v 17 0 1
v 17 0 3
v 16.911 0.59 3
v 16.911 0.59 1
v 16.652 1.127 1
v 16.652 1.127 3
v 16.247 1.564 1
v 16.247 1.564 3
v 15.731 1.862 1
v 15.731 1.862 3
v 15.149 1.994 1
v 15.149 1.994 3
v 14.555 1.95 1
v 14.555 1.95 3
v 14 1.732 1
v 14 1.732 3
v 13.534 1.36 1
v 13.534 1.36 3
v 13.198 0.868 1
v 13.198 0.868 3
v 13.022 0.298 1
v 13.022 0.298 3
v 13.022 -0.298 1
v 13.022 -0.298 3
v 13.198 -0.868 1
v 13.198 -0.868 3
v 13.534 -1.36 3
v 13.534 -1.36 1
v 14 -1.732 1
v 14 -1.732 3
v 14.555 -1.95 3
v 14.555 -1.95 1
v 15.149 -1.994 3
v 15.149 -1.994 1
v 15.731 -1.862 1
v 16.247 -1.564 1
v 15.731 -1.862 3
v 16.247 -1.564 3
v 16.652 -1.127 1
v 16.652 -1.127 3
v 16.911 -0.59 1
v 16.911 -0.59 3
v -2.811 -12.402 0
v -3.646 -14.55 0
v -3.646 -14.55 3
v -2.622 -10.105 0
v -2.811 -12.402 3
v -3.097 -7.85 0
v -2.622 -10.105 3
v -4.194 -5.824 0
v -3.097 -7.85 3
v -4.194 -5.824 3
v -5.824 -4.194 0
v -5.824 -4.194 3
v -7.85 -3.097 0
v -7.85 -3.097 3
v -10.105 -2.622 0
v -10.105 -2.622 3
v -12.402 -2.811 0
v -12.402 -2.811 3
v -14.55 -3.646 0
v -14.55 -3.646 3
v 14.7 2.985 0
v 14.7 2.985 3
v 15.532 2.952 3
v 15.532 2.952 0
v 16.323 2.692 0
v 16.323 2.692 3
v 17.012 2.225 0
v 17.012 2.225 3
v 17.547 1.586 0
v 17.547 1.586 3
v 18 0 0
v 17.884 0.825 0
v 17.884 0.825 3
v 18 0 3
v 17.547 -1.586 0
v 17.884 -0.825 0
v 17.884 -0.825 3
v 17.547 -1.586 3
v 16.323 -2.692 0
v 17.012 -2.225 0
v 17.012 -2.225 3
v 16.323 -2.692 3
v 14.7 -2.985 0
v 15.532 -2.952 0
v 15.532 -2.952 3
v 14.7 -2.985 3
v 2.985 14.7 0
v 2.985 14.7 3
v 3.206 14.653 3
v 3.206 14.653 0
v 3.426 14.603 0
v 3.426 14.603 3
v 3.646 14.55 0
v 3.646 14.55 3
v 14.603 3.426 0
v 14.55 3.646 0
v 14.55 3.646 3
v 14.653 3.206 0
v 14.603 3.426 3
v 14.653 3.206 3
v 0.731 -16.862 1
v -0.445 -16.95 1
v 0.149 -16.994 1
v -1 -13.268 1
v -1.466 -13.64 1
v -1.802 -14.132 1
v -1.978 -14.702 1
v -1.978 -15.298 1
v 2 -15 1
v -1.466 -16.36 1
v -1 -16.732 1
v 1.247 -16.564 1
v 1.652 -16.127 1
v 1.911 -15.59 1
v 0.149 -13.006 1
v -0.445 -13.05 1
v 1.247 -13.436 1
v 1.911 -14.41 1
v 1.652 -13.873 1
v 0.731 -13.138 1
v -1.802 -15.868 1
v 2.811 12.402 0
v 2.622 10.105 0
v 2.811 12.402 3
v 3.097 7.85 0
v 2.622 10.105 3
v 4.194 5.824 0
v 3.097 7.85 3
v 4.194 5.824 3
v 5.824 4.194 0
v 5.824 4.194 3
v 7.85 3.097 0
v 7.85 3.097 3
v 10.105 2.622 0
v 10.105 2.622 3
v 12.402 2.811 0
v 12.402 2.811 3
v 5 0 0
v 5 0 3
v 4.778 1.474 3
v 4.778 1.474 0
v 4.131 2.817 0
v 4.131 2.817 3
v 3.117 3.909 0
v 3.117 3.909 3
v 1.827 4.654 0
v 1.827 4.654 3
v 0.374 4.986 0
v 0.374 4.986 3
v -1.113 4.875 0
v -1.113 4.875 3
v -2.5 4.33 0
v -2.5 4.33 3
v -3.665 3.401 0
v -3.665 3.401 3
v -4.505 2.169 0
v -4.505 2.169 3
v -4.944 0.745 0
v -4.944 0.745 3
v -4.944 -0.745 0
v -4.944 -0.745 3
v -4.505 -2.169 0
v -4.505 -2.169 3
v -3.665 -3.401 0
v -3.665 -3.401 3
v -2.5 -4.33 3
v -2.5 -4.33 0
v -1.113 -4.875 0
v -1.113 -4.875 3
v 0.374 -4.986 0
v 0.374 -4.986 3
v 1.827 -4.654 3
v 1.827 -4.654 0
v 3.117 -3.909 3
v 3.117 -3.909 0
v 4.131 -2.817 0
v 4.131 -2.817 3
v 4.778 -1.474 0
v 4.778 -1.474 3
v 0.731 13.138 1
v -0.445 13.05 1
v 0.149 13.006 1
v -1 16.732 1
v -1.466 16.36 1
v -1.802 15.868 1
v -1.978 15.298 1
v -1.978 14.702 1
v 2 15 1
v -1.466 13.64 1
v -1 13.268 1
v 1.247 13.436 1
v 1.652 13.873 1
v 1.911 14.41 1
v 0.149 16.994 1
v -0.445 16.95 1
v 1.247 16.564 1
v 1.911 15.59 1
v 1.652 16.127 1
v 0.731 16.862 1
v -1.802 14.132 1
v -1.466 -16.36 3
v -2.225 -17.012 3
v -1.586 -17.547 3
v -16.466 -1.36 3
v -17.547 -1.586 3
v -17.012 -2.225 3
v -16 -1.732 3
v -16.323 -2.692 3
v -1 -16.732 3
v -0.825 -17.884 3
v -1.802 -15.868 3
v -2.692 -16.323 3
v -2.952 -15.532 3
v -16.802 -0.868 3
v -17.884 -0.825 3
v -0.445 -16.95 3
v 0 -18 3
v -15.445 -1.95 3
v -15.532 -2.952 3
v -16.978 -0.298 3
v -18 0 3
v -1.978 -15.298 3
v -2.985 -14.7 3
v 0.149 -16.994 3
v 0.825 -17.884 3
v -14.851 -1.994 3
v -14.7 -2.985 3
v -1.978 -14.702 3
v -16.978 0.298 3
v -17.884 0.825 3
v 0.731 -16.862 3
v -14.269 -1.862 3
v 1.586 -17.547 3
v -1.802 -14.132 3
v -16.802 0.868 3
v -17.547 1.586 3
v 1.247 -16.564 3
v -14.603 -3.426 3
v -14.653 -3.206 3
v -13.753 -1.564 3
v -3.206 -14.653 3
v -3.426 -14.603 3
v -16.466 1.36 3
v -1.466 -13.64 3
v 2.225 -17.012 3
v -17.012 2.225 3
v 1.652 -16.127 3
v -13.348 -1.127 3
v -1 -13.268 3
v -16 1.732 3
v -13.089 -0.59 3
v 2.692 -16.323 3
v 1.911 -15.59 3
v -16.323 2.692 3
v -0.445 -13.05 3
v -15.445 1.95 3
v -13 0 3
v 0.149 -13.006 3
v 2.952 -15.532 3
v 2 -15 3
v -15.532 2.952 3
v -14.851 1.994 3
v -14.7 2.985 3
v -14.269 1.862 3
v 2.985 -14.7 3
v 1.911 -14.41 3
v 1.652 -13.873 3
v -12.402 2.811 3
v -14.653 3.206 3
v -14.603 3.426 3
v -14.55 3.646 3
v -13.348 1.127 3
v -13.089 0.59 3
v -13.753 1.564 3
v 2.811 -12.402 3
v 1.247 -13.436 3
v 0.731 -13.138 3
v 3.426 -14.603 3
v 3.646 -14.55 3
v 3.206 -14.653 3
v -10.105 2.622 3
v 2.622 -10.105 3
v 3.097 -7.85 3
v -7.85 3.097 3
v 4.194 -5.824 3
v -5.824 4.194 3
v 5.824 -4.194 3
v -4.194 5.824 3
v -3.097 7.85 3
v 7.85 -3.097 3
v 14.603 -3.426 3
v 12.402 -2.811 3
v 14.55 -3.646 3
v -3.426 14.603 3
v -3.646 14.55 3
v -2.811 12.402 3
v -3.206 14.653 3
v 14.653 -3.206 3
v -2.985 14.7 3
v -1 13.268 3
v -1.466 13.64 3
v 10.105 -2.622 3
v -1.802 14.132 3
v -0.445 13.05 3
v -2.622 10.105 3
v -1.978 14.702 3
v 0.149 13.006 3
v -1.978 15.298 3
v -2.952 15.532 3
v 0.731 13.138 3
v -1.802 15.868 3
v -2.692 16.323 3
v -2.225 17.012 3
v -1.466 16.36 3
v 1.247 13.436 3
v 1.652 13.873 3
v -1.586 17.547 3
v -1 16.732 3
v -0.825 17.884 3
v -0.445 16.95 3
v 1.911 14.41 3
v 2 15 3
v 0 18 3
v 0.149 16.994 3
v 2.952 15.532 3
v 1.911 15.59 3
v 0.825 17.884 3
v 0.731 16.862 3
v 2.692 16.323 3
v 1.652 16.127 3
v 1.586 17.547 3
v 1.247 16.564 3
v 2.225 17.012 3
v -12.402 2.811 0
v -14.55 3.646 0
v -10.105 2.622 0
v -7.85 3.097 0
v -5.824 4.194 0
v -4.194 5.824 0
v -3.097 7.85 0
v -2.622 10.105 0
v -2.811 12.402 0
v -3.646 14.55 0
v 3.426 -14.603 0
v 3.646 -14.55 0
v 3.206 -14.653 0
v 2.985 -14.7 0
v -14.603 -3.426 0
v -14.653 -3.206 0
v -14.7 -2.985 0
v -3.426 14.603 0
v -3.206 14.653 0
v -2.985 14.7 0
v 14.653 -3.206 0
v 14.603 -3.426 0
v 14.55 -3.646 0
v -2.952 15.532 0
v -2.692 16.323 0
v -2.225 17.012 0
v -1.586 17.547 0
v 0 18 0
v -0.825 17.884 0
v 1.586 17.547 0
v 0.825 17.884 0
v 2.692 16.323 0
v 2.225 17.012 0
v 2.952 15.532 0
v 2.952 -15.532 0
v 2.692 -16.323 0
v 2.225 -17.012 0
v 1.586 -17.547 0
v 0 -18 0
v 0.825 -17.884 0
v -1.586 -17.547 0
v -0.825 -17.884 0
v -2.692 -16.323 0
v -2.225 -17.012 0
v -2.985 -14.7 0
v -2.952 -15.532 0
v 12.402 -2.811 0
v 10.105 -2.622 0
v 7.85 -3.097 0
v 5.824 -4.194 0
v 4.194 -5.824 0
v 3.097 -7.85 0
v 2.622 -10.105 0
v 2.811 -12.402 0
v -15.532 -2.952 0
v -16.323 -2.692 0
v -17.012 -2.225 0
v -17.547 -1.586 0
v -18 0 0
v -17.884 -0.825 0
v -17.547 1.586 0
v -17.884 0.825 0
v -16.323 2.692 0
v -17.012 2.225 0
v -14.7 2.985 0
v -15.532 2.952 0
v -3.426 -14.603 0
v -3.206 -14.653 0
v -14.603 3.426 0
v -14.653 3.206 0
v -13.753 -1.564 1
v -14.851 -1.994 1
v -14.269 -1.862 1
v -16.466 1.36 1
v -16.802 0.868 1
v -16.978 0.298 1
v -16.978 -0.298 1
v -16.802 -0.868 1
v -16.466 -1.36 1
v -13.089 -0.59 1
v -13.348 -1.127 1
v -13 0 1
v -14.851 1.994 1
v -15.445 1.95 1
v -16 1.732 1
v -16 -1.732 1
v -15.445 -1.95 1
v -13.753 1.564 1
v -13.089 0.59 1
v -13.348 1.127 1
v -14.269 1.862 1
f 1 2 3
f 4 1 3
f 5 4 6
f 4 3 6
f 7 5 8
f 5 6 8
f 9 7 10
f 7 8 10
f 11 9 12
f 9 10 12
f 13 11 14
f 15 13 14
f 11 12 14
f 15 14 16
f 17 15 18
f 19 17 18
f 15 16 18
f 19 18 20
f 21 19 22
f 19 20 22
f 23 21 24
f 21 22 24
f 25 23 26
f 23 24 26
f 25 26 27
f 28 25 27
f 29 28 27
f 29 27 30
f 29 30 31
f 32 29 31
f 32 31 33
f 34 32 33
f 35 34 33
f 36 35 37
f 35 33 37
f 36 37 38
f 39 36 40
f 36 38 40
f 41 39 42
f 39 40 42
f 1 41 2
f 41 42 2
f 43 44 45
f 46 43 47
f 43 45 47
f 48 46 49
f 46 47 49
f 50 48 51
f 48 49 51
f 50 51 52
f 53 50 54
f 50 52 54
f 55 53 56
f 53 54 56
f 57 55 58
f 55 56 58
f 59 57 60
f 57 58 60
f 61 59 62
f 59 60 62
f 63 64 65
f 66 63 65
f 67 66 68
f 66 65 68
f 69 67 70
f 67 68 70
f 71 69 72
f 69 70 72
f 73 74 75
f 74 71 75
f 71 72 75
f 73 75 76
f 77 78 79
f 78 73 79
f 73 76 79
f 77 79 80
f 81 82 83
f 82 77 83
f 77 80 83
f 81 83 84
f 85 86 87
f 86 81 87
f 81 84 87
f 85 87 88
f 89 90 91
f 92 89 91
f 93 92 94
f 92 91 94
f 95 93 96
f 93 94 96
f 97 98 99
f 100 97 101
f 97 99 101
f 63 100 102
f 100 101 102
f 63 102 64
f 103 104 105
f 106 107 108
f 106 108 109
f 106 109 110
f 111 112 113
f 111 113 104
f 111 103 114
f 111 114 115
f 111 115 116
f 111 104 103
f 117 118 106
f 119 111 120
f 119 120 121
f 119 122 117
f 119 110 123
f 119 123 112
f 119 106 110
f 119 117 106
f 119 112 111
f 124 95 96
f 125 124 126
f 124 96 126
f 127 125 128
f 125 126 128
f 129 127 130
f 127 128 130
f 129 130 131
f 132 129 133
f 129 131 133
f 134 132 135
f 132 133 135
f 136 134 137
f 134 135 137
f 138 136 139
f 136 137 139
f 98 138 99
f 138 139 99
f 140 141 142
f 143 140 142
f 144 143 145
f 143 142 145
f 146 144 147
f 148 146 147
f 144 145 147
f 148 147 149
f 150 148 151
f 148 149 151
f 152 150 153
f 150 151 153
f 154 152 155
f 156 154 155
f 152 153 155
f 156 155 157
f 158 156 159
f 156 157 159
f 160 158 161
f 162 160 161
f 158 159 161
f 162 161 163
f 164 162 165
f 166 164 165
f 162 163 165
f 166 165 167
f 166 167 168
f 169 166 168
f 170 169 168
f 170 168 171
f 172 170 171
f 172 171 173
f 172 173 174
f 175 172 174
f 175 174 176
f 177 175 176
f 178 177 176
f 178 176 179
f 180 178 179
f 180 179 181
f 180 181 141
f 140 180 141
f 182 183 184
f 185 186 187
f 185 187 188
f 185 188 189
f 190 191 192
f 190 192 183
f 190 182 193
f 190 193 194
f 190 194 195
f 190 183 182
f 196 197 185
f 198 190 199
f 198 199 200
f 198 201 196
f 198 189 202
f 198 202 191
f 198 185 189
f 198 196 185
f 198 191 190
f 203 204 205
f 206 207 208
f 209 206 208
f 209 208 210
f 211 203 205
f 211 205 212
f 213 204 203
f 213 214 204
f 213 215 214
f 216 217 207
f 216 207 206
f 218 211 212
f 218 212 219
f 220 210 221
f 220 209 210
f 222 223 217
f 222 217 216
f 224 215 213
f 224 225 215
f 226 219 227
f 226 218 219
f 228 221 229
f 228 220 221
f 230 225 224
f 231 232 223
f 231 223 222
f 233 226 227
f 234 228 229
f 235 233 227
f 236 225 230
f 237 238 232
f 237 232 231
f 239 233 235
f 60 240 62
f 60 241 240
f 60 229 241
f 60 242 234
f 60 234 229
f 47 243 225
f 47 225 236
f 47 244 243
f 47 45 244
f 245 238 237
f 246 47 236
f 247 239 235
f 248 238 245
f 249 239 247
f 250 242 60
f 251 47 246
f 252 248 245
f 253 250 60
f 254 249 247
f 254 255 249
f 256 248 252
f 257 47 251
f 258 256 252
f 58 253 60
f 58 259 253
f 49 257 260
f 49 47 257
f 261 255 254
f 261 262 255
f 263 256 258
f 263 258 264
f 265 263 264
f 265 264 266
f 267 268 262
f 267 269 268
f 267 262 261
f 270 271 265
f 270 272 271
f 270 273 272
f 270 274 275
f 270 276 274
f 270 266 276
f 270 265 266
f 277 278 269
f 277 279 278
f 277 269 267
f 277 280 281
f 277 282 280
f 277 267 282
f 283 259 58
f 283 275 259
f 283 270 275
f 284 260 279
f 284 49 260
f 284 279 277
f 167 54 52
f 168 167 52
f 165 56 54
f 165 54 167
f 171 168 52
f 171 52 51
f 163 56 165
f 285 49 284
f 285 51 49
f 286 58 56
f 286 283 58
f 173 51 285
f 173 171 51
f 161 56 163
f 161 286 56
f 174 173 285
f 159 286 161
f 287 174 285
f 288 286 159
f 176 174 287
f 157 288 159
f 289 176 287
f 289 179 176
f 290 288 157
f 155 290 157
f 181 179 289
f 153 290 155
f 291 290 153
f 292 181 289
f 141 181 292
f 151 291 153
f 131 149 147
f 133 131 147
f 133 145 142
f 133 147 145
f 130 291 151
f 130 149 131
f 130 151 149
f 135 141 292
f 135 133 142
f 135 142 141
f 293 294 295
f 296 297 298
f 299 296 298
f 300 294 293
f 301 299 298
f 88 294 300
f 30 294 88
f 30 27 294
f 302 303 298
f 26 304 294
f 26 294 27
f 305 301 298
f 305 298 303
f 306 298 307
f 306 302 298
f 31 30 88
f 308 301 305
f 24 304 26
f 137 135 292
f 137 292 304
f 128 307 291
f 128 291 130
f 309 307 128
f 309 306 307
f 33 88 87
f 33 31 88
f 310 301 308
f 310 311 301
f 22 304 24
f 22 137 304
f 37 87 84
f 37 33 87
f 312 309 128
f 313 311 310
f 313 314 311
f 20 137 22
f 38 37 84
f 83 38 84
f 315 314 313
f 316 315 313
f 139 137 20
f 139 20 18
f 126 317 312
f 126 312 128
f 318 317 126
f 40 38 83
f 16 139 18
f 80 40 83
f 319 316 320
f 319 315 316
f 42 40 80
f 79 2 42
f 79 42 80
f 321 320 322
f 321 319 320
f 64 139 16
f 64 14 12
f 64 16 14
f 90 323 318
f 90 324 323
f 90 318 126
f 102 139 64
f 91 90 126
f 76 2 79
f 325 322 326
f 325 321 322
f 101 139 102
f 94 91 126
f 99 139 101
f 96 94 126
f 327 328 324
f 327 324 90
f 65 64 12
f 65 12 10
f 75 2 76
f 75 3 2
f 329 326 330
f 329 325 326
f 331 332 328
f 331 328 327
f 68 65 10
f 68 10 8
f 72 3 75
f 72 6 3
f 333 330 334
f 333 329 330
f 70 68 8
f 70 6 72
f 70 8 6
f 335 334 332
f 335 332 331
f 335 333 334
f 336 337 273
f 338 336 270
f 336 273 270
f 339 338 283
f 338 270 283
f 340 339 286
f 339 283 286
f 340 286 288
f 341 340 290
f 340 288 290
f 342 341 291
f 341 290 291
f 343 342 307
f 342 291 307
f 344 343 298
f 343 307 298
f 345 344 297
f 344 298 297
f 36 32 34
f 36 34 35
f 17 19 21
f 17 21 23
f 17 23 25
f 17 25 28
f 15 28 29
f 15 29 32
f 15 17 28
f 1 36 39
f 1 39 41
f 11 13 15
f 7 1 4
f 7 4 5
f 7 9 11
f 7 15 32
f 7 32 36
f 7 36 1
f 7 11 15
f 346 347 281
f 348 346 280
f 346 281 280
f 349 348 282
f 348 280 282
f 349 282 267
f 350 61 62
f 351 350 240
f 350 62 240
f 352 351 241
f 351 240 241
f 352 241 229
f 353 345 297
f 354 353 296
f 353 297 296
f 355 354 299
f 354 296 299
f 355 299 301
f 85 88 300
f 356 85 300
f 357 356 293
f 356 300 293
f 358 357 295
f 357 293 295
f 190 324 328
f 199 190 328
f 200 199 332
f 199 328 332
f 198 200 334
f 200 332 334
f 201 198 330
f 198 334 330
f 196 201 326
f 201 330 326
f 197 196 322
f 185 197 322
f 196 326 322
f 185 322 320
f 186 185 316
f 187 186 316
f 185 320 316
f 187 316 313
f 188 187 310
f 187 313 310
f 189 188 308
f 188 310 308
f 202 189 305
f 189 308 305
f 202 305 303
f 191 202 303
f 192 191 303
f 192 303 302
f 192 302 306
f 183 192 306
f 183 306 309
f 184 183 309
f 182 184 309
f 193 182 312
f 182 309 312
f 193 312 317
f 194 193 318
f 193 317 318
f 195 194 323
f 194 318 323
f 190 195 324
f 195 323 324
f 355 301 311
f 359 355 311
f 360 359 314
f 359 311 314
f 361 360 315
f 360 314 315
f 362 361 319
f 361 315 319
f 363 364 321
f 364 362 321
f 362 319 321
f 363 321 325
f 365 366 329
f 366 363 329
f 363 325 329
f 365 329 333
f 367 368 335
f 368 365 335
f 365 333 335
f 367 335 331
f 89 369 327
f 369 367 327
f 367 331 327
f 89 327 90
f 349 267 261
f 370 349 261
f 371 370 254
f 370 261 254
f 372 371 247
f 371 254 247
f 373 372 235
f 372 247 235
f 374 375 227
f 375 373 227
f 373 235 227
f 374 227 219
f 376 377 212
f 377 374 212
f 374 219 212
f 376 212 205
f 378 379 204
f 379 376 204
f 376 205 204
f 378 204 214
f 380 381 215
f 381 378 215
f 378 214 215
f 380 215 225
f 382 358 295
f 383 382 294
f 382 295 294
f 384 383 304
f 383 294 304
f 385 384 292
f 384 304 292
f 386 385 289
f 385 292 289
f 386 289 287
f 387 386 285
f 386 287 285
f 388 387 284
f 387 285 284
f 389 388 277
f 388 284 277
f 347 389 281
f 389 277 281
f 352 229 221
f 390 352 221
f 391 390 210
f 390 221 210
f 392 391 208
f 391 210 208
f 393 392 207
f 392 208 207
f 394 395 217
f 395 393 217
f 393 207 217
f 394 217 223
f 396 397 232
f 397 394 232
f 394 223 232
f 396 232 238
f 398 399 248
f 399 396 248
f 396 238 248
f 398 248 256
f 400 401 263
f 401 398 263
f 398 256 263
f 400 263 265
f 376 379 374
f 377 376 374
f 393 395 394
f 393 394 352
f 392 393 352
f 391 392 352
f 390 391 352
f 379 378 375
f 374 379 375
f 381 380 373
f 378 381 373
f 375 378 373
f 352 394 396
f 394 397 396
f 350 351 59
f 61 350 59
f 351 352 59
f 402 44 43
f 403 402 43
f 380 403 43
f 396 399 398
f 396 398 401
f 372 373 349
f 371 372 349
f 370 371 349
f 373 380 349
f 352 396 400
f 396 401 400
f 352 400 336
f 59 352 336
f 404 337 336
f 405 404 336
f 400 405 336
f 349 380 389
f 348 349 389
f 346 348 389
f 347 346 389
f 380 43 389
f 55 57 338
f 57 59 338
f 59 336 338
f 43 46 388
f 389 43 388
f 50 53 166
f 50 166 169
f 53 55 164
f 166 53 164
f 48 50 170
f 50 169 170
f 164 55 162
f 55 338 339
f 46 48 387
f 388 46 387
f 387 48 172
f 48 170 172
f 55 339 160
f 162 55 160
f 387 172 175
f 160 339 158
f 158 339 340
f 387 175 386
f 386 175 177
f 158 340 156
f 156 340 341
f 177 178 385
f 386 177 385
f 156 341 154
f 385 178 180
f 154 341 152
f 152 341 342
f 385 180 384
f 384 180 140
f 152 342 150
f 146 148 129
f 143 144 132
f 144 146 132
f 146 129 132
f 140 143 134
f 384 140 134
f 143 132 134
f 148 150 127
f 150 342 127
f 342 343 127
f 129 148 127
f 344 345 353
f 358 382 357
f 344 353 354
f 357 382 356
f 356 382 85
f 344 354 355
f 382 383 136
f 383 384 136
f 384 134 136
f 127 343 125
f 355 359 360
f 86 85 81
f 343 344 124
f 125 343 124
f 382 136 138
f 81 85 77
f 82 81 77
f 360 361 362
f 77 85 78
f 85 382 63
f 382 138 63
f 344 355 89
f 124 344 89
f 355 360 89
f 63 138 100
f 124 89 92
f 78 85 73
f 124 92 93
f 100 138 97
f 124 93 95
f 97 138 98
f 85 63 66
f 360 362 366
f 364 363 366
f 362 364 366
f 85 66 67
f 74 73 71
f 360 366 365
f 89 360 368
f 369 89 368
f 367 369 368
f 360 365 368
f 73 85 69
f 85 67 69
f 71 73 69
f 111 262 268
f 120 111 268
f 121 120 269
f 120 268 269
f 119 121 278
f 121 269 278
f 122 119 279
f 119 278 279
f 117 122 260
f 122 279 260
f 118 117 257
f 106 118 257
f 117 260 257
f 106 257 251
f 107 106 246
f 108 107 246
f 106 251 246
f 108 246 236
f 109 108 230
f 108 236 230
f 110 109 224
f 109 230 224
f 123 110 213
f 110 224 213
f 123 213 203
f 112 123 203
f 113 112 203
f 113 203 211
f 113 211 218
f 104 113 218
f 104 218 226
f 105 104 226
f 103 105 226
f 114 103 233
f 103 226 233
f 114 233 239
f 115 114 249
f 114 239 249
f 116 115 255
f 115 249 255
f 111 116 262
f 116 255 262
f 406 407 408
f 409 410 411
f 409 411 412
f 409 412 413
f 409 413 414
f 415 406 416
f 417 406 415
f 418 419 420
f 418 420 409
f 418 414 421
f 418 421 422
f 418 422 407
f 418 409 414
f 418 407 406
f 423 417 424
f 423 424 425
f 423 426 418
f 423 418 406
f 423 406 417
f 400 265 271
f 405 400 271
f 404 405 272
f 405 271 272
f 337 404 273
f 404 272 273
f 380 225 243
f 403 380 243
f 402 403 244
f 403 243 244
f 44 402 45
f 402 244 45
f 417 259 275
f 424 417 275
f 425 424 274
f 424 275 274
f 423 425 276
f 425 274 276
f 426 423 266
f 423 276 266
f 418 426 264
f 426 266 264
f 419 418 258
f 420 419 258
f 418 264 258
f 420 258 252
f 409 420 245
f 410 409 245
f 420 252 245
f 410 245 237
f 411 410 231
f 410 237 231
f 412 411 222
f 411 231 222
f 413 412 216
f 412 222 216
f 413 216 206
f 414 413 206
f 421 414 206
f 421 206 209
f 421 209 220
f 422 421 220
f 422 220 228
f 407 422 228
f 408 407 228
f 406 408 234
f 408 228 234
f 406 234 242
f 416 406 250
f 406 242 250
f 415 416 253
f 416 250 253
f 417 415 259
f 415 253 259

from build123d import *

# Parameters (mm, degrees)
F0_R      = 20
F1_DEPTH  = 3
F2_R      = 5
F3_DEPTH  = 25
F4_R      = 2
F5_DEPTH  = 2
F6_R      = 8
F7_DEPTH  = 25
F8_SIZE   = 1.5
F9_R      = 28.420768
F10_DEPTH = 25


with BuildPart() as f1:
    # F0 (on Top) → F1 (new body)
    with BuildSketch(Plane.XY):
        Circle(F0_R)
    extrude(amount=F1_DEPTH)

    # F2 (on face) → F3 (cut)
    with BuildSketch(Plane.XY.offset(3)):
        Circle(F2_R)
    extrude(amount=-F3_DEPTH, mode=Mode.SUBTRACT)

    # F4 (on face) → F5 (cut)
    with BuildSketch(Plane.XY.offset(3)):
        with Locations((0, 15)):
            Circle(F4_R)
        with Locations((15, 0)):
            Circle(F4_R)
        with Locations((0, -15)):
            Circle(F4_R)
        with Locations((-15, 0)):
            Circle(F4_R)
    extrude(amount=-F5_DEPTH, mode=Mode.SUBTRACT)

    # F6 (on face) → F7 (cut)
    with BuildSketch(Plane.XY.offset(3)):
        with Locations((-10.606602, 10.606602)):
            Circle(F6_R)
        with Locations((10.606602, 10.606602)):
            Circle(F6_R)
        with Locations((10.606602, -10.606602)):
            Circle(F6_R)
        with Locations((-10.606602, -10.606602)):
            Circle(F6_R)
    extrude(amount=-F7_DEPTH, mode=Mode.SUBTRACT)

    # F8
    f8_edges = [f1.edges().sort_by_distance(p)[0] for p in [
        (-20, 0, 3),
    ]]
    chamfer(f8_edges, length=F8_SIZE)

    # F9 (on face) → F10 (cut)
    with BuildSketch(Plane.XY.offset(3)):
        with Locations((1.058917, 0)):
            Circle(F9_R)
        with BuildLine():
            ThreePointArc((-14.7, -2.984962), (-18, 0), (-14.7, 2.984962))
            ThreePointArc((-14.7, 2.984962), (-10.606602, 10.606602), (-2.984962, 14.7))
            ThreePointArc((-2.984962, 14.7), (0, 18), (2.984962, 14.7))
            ThreePointArc((2.984962, 14.7), (10.606602, 10.606602), (14.7, 2.984962))
            ThreePointArc((14.7, 2.984962), (18, 0), (14.7, -2.984962))
            ThreePointArc((14.7, -2.984962), (10.606602, -10.606602), (2.984962, -14.7))
            ThreePointArc((2.984962, -14.7), (0, -18), (-2.984962, -14.7))
            ThreePointArc((-2.984962, -14.7), (-10.606602, -10.606602), (-14.7, -2.984962))
        make_face(mode=Mode.SUBTRACT)
    extrude(amount=-F10_DEPTH, mode=Mode.SUBTRACT)


solid = f1.part
